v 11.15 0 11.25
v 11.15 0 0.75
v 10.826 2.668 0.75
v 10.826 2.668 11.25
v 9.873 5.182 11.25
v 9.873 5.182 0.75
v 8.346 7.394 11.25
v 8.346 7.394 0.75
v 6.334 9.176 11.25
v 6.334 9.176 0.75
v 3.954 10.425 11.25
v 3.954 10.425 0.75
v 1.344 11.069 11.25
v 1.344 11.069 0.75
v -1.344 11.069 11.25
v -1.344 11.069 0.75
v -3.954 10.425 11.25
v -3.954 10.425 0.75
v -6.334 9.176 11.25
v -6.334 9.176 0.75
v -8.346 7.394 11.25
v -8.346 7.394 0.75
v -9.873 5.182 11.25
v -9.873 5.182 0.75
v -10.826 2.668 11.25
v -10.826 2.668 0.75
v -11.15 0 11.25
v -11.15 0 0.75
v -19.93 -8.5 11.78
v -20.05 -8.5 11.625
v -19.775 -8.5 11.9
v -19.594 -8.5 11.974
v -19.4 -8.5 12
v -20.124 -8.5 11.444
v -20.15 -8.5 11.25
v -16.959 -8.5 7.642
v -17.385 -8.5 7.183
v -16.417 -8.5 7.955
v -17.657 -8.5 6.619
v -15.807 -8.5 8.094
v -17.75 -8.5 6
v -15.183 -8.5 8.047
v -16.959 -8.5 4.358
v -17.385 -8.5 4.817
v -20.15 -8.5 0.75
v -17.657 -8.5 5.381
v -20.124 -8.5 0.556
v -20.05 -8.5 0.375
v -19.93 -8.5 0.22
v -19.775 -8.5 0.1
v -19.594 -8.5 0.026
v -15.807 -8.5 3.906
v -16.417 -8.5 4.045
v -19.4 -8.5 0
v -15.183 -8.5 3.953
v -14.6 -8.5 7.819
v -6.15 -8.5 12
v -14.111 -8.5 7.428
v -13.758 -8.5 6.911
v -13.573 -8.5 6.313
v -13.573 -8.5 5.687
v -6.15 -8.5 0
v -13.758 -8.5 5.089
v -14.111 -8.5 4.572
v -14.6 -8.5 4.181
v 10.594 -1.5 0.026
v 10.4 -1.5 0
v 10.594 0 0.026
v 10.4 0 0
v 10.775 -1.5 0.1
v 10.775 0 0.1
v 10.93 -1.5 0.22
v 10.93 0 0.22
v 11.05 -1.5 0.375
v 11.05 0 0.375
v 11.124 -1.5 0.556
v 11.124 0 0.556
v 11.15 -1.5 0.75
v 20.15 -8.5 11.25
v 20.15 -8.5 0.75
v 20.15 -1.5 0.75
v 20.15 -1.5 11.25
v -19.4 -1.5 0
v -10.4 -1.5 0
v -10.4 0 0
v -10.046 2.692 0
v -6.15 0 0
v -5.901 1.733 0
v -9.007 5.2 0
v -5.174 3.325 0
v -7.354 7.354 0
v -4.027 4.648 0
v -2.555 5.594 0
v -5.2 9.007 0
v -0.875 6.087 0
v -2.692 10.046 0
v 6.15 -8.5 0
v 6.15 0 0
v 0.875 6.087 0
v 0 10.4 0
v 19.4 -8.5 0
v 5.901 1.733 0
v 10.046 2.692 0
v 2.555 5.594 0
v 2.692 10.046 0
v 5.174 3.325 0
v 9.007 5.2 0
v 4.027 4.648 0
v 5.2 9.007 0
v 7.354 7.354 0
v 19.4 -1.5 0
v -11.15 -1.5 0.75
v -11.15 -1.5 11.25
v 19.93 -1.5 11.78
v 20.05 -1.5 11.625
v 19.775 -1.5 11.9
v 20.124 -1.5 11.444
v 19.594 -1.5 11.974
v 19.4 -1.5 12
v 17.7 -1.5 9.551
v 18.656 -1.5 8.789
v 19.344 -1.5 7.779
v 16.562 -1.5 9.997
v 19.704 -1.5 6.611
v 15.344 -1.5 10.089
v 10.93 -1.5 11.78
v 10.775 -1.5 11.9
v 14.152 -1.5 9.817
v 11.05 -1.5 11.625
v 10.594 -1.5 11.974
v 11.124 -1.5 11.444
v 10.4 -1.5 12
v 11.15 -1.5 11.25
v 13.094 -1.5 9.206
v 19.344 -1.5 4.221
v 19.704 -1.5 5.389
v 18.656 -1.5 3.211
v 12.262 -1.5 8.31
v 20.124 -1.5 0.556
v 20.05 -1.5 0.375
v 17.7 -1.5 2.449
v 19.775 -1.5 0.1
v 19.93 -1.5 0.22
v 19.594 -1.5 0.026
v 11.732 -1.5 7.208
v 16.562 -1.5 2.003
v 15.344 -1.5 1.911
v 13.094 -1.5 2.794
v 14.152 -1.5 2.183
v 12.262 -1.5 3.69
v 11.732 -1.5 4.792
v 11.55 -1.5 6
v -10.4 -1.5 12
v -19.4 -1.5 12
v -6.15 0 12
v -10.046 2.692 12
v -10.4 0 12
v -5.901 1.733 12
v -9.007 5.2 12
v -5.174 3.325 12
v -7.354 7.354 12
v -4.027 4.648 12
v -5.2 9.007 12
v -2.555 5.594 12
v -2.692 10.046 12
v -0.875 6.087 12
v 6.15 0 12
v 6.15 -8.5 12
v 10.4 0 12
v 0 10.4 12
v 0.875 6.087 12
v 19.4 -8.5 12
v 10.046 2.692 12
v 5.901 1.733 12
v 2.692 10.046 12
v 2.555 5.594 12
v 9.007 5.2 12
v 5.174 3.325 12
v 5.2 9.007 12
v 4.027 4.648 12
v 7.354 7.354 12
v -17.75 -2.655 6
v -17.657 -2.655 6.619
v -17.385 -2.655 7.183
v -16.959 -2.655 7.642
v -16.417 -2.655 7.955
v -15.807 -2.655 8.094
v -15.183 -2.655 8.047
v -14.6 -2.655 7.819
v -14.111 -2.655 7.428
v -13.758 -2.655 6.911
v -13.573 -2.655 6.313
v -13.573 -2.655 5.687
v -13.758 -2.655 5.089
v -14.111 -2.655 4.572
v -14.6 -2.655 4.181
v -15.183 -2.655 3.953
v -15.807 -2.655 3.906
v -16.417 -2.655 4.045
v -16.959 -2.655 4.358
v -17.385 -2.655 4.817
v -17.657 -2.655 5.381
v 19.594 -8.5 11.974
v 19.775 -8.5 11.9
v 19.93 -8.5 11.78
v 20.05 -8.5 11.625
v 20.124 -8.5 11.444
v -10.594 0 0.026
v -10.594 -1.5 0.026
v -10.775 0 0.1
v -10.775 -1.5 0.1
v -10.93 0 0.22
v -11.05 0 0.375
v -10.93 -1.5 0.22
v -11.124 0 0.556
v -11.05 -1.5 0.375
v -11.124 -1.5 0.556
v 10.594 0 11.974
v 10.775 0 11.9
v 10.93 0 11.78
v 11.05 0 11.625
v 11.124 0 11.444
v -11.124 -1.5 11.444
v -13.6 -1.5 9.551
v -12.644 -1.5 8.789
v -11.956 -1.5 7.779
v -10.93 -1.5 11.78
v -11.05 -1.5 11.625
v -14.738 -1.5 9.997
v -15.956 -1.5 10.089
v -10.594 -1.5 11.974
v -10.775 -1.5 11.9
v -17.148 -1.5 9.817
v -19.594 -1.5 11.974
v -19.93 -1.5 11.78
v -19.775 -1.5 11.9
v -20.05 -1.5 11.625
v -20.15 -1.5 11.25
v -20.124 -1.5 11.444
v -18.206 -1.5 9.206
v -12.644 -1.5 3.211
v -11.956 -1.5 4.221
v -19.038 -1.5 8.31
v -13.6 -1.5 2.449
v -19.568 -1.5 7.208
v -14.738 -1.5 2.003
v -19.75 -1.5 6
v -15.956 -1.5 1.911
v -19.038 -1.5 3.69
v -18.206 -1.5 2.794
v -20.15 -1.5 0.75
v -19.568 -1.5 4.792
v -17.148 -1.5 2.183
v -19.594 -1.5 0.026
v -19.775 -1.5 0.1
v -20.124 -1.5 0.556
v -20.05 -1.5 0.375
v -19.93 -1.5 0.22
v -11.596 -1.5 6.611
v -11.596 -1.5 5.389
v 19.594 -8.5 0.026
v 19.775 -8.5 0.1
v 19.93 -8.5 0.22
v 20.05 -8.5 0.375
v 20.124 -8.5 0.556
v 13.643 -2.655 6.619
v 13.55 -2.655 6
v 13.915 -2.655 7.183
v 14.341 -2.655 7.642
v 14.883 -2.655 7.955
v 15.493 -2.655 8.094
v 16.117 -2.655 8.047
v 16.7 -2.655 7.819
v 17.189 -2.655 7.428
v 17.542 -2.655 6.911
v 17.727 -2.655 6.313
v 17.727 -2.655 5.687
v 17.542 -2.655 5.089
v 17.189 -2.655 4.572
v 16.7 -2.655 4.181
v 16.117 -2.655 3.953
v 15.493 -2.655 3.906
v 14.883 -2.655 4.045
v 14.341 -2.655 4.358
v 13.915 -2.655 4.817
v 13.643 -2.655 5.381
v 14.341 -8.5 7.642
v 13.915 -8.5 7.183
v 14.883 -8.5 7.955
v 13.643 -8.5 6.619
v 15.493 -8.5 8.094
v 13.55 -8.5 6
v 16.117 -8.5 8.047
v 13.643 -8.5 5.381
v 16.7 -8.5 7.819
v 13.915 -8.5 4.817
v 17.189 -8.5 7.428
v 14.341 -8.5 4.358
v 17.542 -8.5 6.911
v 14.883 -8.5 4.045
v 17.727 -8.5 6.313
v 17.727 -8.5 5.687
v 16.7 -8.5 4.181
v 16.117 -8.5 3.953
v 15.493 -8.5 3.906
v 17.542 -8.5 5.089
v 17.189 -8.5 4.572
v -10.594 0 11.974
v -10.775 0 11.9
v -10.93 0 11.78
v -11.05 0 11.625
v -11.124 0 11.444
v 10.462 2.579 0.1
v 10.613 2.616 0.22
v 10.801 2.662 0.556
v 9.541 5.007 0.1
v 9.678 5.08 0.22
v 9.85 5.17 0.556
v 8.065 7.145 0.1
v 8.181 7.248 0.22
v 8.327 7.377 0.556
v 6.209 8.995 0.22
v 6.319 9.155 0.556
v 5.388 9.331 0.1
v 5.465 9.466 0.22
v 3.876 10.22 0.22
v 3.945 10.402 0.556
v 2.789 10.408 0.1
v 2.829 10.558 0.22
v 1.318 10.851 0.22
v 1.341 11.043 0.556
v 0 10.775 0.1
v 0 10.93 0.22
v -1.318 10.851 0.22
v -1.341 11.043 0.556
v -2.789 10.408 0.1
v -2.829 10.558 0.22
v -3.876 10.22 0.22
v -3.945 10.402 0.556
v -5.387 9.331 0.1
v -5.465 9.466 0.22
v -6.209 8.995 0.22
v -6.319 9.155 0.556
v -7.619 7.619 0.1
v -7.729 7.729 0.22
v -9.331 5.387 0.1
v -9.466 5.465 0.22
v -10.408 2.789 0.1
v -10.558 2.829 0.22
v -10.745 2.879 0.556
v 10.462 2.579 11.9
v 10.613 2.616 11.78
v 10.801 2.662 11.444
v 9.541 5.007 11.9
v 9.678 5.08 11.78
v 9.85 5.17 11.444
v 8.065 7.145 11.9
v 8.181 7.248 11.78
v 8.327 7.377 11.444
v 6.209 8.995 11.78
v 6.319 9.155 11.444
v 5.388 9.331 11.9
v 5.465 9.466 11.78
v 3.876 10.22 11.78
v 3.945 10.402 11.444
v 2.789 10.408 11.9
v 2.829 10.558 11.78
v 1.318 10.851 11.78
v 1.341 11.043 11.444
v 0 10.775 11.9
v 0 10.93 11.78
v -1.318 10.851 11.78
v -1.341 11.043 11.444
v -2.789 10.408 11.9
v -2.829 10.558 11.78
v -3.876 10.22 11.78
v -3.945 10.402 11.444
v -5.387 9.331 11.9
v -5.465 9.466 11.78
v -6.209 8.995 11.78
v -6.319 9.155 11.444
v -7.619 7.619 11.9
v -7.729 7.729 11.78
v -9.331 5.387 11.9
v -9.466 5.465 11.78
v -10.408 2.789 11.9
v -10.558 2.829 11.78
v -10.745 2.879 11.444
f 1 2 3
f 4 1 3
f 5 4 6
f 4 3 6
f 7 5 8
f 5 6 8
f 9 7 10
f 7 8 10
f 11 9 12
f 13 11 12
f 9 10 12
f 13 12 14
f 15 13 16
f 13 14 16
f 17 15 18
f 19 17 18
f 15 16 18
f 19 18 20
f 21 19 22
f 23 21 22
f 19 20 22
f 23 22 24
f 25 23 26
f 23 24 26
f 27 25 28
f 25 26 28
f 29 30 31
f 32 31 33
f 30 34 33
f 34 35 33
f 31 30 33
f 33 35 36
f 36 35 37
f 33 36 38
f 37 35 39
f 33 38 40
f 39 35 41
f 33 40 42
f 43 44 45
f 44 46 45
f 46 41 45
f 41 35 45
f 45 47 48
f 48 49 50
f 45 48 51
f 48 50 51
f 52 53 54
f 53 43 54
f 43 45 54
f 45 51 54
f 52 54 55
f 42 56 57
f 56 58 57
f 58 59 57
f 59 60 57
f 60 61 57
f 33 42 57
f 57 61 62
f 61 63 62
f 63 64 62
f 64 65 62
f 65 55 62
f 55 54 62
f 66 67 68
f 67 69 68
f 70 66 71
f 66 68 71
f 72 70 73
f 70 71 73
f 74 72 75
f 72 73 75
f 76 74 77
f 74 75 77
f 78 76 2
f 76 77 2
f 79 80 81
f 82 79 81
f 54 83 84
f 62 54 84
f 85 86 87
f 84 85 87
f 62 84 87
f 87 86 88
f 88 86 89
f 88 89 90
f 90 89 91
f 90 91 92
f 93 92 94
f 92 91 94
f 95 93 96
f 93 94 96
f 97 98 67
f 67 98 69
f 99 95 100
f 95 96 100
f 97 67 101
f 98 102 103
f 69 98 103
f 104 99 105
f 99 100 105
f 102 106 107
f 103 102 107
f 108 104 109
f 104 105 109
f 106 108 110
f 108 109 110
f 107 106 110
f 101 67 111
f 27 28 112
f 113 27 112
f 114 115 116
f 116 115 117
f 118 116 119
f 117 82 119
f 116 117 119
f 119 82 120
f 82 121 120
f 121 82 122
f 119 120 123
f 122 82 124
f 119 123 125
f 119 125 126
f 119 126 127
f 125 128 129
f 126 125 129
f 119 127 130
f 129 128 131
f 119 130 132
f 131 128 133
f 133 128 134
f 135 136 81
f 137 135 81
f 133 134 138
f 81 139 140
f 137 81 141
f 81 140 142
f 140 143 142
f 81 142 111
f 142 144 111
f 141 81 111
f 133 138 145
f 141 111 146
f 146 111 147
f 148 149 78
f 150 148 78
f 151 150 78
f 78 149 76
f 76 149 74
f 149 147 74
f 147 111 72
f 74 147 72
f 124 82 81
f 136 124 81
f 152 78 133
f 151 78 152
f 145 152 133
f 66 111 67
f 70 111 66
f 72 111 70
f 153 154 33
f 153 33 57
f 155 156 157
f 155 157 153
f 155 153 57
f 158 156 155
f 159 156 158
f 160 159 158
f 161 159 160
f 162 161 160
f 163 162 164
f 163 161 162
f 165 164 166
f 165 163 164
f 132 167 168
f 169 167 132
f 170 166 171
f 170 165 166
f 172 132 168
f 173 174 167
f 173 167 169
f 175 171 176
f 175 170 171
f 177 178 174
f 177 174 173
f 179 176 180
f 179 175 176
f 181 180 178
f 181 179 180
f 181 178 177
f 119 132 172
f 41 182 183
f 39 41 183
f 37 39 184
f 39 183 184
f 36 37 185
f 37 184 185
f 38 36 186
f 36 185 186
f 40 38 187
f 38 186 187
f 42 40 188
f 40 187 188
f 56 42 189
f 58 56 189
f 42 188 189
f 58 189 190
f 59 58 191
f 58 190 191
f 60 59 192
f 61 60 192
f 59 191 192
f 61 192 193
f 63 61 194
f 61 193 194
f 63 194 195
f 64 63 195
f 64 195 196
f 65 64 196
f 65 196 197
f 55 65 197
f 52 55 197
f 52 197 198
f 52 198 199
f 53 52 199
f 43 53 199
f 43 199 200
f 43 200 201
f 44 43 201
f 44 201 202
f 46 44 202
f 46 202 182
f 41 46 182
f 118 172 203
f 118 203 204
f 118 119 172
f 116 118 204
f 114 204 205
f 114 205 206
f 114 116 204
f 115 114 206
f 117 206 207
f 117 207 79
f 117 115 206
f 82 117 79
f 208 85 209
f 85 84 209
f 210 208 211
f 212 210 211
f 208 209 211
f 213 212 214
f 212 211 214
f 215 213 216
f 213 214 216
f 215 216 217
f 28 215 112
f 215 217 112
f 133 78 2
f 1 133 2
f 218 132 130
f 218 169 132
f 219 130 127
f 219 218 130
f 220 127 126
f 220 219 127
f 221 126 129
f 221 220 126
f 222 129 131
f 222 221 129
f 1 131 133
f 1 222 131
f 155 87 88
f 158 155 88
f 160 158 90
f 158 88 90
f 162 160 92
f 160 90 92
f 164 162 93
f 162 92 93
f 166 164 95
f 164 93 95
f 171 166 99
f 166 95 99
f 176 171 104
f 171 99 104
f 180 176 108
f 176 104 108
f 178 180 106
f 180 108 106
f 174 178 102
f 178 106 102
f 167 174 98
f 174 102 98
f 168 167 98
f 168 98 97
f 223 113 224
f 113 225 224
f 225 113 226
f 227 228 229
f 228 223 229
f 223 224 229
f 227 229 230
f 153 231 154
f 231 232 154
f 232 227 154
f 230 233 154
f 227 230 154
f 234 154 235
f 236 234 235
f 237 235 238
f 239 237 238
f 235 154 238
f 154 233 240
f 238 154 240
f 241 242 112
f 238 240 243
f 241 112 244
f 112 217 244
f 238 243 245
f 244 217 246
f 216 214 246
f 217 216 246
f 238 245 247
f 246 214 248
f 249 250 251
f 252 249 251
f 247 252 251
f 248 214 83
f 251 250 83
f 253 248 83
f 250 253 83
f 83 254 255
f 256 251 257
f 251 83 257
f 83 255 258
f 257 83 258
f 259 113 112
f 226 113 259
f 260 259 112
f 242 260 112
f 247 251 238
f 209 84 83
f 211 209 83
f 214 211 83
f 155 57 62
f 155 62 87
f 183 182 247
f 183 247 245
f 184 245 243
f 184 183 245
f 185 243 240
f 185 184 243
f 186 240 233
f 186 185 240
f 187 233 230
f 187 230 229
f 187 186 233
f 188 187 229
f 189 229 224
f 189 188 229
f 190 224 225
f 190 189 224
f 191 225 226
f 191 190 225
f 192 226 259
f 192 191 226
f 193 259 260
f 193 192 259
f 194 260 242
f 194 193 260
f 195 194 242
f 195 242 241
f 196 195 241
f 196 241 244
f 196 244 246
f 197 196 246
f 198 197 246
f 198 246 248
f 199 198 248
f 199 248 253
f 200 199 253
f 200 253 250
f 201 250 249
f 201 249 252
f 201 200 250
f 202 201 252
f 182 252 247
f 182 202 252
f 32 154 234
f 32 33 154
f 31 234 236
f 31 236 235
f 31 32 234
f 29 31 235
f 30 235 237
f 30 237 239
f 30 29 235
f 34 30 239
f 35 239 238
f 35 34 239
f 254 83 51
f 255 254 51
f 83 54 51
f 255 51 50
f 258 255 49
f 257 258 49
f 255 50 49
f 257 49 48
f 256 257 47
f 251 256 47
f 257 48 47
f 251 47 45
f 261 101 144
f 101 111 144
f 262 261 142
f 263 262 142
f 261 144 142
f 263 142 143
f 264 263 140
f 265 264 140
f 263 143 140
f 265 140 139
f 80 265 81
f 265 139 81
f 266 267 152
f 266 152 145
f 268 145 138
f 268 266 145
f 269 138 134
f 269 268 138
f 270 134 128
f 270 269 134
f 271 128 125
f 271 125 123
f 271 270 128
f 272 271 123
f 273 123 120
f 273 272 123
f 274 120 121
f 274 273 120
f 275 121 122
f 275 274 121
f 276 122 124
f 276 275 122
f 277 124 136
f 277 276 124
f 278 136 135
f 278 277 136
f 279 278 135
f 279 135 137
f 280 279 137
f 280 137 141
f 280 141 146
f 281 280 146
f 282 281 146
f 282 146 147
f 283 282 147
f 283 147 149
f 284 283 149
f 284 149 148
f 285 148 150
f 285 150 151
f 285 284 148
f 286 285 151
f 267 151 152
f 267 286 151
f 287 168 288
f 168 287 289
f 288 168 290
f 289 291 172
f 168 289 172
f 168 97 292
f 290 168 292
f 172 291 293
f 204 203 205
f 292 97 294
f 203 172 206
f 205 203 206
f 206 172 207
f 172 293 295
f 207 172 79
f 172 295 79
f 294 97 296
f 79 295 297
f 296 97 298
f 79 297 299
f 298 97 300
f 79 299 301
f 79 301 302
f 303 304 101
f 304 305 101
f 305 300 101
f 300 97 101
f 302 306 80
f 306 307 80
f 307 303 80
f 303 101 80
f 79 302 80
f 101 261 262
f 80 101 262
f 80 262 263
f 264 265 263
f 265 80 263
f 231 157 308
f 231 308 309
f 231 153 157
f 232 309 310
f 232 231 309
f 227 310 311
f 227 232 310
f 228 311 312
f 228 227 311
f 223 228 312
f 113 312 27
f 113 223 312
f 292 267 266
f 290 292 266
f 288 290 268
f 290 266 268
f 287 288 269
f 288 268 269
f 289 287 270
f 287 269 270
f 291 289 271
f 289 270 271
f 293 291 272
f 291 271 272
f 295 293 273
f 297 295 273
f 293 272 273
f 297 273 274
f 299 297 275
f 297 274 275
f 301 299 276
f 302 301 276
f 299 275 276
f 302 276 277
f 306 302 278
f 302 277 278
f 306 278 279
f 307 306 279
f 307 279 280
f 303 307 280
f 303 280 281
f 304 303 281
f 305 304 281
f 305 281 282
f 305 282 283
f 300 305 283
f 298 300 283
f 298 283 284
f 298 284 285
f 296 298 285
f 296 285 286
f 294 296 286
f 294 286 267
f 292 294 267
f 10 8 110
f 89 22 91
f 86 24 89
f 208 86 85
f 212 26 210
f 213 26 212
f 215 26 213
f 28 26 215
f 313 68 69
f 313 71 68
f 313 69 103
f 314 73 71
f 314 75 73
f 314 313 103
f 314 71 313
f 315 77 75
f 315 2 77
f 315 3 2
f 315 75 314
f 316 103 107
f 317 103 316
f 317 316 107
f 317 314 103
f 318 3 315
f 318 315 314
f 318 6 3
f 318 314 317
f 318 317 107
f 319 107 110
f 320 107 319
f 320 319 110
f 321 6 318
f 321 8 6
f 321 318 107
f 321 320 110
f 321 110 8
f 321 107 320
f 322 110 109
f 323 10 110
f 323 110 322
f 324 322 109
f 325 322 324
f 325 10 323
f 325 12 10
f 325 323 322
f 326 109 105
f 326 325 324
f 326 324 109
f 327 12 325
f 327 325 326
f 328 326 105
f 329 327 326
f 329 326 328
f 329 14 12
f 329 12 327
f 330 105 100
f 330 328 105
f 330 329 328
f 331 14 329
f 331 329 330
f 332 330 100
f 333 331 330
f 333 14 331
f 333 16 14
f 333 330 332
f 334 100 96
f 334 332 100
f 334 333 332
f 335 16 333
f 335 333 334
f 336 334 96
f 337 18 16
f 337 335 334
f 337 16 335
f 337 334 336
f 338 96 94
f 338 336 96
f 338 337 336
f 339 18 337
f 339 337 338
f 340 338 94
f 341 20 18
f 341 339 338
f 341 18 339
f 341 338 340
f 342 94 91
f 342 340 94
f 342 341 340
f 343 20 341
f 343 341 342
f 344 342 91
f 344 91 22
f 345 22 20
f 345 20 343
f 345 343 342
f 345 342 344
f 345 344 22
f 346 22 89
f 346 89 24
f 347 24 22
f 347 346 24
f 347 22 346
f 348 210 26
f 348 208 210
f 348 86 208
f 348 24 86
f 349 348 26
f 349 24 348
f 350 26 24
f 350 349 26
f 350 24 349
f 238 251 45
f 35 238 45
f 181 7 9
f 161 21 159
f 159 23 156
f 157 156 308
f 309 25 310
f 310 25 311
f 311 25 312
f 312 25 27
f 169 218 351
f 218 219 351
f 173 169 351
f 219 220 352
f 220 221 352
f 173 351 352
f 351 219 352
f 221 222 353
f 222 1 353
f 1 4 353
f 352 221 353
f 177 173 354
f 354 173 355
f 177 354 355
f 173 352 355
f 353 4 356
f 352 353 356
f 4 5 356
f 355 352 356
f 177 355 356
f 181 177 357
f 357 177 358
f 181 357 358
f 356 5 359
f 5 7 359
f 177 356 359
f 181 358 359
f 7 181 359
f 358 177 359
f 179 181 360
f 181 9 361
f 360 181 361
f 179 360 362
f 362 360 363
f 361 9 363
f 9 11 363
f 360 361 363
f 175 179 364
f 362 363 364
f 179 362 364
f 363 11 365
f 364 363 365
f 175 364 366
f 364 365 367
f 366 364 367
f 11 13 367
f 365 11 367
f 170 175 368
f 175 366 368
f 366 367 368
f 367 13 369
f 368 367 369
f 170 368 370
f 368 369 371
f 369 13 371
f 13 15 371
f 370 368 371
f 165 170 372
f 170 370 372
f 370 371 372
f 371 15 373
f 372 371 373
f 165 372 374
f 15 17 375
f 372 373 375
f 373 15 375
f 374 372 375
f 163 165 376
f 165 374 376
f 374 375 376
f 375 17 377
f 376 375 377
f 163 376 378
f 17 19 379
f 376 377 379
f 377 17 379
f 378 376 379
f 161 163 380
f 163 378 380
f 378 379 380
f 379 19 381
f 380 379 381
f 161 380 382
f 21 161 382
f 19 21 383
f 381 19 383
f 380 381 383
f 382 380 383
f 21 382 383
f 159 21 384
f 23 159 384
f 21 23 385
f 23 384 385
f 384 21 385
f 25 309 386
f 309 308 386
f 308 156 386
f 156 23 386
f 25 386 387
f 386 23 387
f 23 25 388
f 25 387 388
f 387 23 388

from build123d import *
from OCP.BRepFilletAPI import BRepFilletAPI_MakeChamfer

# Parameters (mm, degrees)
BOSS_EXTRUDE1_DEPTH = 12
SKETCH4_R           = 2.1
CUT_EXTRUDE1_DEPTH  = 27.646669586
CHAMFER1_SIZE       = 2
CHAMFER1_SIZE2      = 1.154700538
FILLET2_R           = 0.75


with BuildPart() as part:
    # Sketch1 → Boss-Extrude1 (new body)
    with BuildSketch(Plane.XY):
        with BuildLine():
            Line((-11.15, 0), (-11.15, -1.5))
            Line((-11.15, -1.5), (-20.15, -1.5))
            Line((-20.15, -1.5), (-20.15, -8.5))
            Line((-20.15, -8.5), (-6.15, -8.5))
            Line((-6.15, -8.5), (-6.15, 0))
            ThreePointArc((-6.15, 0), (0, 6.15), (6.15, 0))
            Line((6.15, 0), (6.15, -8.5))
            Line((6.15, -8.5), (20.15, -8.5))
            Line((20.15, -8.5), (20.15, -1.5))
            Line((20.15, -1.5), (11.15, -1.5))
            Line((11.15, -1.5), (11.15, 0))
            ThreePointArc((11.15, 0), (0, 11.15), (-11.15, 0))
        make_face()
    extrude(amount=BOSS_EXTRUDE1_DEPTH)

    # Sketch4 → Cut-Extrude1 (cut, through all)
    with BuildSketch(Plane(origin=(0, -1.5, 0), x_dir=(1, 0, 0), z_dir=(0, 1, 0))):
        with Locations(Location((-15.65, -6, 0), (0, 0, 180))):
            Circle(SKETCH4_R)
        with Locations(Location((15.65, -6, 0), (0, 0, 180))):
            Circle(SKETCH4_R)
    extrude(amount=-CUT_EXTRUDE1_DEPTH, mode=Mode.SUBTRACT)

    # Chamfer1: one chamfer whose edges measure the first distance from different faces: ONE call of the kernel's chamfer builder (chamfer() names one face for all edges)
    chamfer1_edges_1 = [part.edges().sort_by_distance(p)[0] for p in [
        (-13.55, -1.5, 6),
    ]]
    chamfer1_side_1 = [part.faces().sort_by_distance(p)[0] for p in [
        (-11.3, -1.5, 6),
    ]]
    chamfer1_edges_2 = [part.edges().sort_by_distance(p)[0] for p in [
        (17.75, -1.5, 6),
    ]]
    chamfer1_side_2 = [part.faces().sort_by_distance(p)[0] for p in [
        (20, -1.5, 6),
    ]]
    chamfer1 = BRepFilletAPI_MakeChamfer(part.part.solid().wrapped)
    for e in chamfer1_edges_1:
        chamfer1.Add(CHAMFER1_SIZE, CHAMFER1_SIZE2, e.wrapped, chamfer1_side_1[0].wrapped)  # the first distance lies on this face
    for e in chamfer1_edges_2:
        chamfer1.Add(CHAMFER1_SIZE, CHAMFER1_SIZE2, e.wrapped, chamfer1_side_2[0].wrapped)  # the first distance lies on this face
    add(Compound.cast(chamfer1.Shape()), mode=Mode.REPLACE)

    # Fillet2
    fillet2_edges = [part.edges().sort_by_distance(p)[0] for p in [
        (11.15, -0.75, 0),
        (20.15, -5, 0),
        (-20.15, -5, 0),
        (-11.15, -0.75, 0),
        (0, 11.15, 0),
        (-20.15, -5, 12),
        (20.15, -5, 12),
        (11.15, -0.75, 12),
        (0, 11.15, 12),
        (-11.15, -0.75, 12),
    ]]
    fillet(fillet2_edges, radius=FILLET2_R)


solid = part.part
